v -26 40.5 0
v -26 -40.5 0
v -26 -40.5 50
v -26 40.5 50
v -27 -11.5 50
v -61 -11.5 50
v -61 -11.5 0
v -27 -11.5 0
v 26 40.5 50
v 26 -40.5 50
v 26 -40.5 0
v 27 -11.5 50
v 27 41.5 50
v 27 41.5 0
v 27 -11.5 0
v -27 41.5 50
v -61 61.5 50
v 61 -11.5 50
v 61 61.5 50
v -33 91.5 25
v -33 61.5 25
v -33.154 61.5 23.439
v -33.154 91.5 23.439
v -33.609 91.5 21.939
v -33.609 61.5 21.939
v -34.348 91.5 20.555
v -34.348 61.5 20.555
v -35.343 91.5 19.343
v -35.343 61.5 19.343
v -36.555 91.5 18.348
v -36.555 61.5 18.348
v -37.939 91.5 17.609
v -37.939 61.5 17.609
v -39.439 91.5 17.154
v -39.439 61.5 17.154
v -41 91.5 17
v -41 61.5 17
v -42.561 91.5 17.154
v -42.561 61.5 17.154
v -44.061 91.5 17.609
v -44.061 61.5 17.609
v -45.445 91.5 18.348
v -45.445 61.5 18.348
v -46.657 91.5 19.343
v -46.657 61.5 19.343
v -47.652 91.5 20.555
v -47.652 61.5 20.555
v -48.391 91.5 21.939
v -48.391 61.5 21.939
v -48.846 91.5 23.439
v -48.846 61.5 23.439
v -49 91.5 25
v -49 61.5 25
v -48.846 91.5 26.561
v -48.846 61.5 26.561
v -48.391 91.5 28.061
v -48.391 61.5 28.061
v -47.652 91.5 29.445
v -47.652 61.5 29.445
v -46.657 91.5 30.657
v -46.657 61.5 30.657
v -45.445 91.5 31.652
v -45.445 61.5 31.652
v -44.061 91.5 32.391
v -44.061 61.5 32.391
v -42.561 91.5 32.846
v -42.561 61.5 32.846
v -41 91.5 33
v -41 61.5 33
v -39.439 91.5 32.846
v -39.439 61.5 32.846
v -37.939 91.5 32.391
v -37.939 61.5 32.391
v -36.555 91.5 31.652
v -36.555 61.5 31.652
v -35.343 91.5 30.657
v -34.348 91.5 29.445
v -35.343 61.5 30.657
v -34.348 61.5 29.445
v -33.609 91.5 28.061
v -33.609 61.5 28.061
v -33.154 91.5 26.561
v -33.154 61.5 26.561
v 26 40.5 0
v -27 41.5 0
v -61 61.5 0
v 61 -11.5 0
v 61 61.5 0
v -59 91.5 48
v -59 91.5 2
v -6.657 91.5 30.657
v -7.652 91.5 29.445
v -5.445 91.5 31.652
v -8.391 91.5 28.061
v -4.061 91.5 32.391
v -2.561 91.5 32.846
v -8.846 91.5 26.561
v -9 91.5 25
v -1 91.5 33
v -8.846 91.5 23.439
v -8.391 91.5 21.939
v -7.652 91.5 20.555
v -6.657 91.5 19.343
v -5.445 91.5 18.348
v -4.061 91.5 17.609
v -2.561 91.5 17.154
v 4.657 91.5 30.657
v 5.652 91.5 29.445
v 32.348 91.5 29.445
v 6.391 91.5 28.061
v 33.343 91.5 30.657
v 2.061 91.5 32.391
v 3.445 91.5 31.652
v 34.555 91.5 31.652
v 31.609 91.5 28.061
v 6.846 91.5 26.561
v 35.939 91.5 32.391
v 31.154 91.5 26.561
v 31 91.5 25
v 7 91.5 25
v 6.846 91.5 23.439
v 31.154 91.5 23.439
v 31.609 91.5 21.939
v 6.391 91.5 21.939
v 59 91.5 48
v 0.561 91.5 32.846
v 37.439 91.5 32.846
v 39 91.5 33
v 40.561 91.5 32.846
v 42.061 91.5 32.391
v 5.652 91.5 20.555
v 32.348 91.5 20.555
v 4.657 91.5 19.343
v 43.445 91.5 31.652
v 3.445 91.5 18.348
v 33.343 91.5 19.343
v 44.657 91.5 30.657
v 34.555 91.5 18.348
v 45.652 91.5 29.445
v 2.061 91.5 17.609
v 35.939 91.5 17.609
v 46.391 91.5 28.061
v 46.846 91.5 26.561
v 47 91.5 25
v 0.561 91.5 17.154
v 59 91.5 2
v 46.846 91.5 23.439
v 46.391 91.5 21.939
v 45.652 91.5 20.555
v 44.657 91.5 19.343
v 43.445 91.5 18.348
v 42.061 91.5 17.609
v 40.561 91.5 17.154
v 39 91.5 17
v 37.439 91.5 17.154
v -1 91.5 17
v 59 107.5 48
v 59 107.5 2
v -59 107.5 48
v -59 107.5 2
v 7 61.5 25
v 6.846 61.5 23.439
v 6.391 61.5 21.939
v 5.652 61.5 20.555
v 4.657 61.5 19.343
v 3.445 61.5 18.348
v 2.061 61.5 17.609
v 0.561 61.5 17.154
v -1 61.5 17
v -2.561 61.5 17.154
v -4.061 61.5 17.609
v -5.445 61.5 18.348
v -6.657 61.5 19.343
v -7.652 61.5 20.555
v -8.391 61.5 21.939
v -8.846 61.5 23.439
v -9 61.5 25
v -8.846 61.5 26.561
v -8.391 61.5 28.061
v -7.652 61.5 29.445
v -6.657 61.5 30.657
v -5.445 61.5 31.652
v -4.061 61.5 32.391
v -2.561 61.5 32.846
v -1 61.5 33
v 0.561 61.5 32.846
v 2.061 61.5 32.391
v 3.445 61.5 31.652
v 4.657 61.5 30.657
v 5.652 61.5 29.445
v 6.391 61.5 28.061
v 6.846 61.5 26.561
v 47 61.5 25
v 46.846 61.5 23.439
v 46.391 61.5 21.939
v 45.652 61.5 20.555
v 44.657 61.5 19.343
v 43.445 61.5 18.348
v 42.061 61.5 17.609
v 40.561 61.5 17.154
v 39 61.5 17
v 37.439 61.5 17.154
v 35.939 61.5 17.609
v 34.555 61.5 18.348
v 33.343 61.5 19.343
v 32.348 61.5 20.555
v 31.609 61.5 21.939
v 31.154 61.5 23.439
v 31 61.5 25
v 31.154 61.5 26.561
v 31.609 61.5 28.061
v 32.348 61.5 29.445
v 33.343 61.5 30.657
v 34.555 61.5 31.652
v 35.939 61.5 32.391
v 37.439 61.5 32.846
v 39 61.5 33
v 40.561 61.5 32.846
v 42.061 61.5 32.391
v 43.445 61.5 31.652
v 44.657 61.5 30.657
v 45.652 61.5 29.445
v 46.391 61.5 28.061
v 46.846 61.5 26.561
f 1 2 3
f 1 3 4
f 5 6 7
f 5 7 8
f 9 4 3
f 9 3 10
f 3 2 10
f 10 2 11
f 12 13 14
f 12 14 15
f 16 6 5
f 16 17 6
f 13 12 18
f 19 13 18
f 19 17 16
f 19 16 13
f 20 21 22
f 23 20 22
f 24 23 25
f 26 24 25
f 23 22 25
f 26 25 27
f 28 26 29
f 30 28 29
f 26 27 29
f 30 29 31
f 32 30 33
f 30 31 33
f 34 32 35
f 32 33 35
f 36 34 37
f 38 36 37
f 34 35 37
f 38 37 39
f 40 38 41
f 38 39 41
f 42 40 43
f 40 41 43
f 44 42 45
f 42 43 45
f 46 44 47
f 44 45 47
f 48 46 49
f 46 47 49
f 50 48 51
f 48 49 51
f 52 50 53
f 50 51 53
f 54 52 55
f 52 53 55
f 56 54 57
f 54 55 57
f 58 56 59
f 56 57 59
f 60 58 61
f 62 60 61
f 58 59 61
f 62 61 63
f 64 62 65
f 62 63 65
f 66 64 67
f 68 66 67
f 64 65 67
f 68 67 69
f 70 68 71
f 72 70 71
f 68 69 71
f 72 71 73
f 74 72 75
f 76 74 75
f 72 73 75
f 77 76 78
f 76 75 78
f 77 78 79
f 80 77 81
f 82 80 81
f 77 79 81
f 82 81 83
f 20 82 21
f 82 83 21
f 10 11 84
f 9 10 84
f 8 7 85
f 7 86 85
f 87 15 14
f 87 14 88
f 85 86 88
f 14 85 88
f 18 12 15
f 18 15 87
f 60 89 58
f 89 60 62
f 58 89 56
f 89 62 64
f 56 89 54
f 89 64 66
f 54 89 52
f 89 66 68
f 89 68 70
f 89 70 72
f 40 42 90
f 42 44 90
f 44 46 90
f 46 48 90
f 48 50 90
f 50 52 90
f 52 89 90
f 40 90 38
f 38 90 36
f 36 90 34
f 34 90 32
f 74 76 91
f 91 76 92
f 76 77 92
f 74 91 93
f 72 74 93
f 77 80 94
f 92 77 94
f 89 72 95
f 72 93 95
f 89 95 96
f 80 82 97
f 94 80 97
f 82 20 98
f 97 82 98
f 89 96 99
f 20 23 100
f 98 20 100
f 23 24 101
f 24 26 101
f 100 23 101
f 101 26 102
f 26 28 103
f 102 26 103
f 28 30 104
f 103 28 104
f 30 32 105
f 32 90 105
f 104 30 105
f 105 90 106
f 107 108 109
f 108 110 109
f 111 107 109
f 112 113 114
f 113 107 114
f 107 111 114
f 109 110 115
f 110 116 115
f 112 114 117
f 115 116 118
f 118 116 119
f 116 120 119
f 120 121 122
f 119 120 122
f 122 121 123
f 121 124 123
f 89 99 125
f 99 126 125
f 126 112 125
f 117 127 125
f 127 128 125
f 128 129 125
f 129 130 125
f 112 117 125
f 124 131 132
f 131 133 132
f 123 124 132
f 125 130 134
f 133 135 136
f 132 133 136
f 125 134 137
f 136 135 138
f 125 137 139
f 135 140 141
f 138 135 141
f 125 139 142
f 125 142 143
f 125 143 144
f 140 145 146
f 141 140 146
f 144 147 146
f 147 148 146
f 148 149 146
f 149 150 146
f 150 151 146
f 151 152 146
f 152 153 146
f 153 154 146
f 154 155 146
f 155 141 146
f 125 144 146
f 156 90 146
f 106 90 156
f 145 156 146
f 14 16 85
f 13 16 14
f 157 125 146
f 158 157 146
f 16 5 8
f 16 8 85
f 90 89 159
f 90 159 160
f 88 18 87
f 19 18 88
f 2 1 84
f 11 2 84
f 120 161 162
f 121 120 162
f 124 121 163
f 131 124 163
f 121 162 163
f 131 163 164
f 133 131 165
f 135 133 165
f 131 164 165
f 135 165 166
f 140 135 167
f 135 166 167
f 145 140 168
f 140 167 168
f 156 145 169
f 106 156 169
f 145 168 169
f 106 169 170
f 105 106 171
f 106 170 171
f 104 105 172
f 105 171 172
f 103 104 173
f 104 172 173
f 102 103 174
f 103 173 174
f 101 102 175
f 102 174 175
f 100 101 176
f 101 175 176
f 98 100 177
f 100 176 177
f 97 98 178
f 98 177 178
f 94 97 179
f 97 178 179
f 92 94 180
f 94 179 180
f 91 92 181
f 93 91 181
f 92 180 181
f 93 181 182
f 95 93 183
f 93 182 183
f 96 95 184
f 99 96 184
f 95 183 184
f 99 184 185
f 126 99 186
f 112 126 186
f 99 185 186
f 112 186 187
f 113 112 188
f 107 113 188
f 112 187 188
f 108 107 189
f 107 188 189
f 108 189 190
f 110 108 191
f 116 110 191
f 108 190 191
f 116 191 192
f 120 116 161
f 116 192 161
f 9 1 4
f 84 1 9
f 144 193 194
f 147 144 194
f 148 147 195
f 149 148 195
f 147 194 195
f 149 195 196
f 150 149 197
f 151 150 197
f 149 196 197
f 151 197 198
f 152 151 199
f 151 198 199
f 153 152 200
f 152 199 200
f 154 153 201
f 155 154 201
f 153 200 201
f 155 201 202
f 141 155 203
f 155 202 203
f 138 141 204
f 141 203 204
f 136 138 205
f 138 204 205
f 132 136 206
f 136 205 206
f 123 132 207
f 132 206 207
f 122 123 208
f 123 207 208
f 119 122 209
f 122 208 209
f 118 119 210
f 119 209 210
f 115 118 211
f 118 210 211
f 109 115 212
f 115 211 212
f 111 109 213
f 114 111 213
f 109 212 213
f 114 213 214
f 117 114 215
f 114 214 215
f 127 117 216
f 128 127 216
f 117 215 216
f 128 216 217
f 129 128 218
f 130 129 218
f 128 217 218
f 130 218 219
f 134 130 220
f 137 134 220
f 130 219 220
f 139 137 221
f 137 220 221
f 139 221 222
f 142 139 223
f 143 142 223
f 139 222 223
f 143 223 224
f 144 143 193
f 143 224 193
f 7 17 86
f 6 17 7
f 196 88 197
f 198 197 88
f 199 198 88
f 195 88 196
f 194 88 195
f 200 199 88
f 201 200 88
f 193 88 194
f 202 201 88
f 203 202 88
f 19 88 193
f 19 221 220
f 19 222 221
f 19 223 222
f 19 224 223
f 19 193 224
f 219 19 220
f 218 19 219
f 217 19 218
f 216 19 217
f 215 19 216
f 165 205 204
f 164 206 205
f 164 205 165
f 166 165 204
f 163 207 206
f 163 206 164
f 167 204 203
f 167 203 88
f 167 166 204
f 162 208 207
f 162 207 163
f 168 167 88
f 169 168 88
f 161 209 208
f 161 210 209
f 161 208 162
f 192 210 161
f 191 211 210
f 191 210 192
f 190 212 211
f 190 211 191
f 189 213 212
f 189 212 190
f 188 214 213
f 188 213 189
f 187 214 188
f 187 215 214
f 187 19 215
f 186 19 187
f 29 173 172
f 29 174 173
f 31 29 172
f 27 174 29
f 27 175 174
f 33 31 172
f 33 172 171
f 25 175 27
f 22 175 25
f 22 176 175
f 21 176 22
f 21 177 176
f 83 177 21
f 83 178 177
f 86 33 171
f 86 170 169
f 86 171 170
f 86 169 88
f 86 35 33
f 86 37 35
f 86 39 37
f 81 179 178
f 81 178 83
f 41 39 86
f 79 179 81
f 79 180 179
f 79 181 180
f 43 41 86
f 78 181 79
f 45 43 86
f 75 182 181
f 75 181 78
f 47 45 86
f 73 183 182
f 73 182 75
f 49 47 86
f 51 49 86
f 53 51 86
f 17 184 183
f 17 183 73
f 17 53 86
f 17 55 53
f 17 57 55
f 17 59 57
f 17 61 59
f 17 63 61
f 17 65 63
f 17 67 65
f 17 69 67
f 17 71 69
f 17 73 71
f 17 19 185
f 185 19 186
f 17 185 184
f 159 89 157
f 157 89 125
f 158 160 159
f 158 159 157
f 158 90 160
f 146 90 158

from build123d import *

# Parameters (mm, degrees)
SKETCH_1_W      = 52
SKETCH_1_H      = 81
EXTRUDE_1_DEPTH = 50
EXTRUDE_2_DEPTH = 50
SKETCH_3_R      = 8
EXTRUDE_3_DEPTH = 30
SKETCH_4_W      = 118
SKETCH_4_H      = 46
EXTRUDE_4_DEPTH = 16


with BuildPart() as part:
    # 草图1 → 凸台-拉伸1 (new body)
    with BuildSketch(Plane.XY):
        Rectangle(SKETCH_1_W, SKETCH_1_H)
    extrude(amount=EXTRUDE_1_DEPTH)


with BuildPart() as body_2:
    # 草图2 → 凸台-拉伸2 (new body)
    with BuildSketch(Plane.XY.offset(50)):
        Polygon((-61, -11.5), (-27, -11.5), (-27, 41.5), (27, 41.5), (27, -11.5), (61, -11.5), (61, 61.5), (-61, 61.5), align=None)
    extrude(amount=-EXTRUDE_2_DEPTH)

    # 草图3 → 凸台-拉伸3 (add)
    with BuildSketch(Plane(origin=(0, 61.5, 0), x_dir=(1, 0, 0), z_dir=(0, 1, 0))):
        with Locations((-41, -25)):
            Circle(SKETCH_3_R)
        with Locations((-1, -25)):
            Circle(SKETCH_3_R)
        with Locations((39, -25)):
            Circle(SKETCH_3_R)
    extrude(amount=EXTRUDE_3_DEPTH)

    # 草图4 → 凸台-拉伸4 (add)
    with BuildSketch(Plane(origin=(0, 91.5, 0), x_dir=(1, 0, 0), z_dir=(0, 1, 0))):
        with Locations((0, -25)):
            Rectangle(SKETCH_4_W, SKETCH_4_H)
    extrude(amount=EXTRUDE_4_DEPTH)


solid = Compound([part.part, body_2.part])
